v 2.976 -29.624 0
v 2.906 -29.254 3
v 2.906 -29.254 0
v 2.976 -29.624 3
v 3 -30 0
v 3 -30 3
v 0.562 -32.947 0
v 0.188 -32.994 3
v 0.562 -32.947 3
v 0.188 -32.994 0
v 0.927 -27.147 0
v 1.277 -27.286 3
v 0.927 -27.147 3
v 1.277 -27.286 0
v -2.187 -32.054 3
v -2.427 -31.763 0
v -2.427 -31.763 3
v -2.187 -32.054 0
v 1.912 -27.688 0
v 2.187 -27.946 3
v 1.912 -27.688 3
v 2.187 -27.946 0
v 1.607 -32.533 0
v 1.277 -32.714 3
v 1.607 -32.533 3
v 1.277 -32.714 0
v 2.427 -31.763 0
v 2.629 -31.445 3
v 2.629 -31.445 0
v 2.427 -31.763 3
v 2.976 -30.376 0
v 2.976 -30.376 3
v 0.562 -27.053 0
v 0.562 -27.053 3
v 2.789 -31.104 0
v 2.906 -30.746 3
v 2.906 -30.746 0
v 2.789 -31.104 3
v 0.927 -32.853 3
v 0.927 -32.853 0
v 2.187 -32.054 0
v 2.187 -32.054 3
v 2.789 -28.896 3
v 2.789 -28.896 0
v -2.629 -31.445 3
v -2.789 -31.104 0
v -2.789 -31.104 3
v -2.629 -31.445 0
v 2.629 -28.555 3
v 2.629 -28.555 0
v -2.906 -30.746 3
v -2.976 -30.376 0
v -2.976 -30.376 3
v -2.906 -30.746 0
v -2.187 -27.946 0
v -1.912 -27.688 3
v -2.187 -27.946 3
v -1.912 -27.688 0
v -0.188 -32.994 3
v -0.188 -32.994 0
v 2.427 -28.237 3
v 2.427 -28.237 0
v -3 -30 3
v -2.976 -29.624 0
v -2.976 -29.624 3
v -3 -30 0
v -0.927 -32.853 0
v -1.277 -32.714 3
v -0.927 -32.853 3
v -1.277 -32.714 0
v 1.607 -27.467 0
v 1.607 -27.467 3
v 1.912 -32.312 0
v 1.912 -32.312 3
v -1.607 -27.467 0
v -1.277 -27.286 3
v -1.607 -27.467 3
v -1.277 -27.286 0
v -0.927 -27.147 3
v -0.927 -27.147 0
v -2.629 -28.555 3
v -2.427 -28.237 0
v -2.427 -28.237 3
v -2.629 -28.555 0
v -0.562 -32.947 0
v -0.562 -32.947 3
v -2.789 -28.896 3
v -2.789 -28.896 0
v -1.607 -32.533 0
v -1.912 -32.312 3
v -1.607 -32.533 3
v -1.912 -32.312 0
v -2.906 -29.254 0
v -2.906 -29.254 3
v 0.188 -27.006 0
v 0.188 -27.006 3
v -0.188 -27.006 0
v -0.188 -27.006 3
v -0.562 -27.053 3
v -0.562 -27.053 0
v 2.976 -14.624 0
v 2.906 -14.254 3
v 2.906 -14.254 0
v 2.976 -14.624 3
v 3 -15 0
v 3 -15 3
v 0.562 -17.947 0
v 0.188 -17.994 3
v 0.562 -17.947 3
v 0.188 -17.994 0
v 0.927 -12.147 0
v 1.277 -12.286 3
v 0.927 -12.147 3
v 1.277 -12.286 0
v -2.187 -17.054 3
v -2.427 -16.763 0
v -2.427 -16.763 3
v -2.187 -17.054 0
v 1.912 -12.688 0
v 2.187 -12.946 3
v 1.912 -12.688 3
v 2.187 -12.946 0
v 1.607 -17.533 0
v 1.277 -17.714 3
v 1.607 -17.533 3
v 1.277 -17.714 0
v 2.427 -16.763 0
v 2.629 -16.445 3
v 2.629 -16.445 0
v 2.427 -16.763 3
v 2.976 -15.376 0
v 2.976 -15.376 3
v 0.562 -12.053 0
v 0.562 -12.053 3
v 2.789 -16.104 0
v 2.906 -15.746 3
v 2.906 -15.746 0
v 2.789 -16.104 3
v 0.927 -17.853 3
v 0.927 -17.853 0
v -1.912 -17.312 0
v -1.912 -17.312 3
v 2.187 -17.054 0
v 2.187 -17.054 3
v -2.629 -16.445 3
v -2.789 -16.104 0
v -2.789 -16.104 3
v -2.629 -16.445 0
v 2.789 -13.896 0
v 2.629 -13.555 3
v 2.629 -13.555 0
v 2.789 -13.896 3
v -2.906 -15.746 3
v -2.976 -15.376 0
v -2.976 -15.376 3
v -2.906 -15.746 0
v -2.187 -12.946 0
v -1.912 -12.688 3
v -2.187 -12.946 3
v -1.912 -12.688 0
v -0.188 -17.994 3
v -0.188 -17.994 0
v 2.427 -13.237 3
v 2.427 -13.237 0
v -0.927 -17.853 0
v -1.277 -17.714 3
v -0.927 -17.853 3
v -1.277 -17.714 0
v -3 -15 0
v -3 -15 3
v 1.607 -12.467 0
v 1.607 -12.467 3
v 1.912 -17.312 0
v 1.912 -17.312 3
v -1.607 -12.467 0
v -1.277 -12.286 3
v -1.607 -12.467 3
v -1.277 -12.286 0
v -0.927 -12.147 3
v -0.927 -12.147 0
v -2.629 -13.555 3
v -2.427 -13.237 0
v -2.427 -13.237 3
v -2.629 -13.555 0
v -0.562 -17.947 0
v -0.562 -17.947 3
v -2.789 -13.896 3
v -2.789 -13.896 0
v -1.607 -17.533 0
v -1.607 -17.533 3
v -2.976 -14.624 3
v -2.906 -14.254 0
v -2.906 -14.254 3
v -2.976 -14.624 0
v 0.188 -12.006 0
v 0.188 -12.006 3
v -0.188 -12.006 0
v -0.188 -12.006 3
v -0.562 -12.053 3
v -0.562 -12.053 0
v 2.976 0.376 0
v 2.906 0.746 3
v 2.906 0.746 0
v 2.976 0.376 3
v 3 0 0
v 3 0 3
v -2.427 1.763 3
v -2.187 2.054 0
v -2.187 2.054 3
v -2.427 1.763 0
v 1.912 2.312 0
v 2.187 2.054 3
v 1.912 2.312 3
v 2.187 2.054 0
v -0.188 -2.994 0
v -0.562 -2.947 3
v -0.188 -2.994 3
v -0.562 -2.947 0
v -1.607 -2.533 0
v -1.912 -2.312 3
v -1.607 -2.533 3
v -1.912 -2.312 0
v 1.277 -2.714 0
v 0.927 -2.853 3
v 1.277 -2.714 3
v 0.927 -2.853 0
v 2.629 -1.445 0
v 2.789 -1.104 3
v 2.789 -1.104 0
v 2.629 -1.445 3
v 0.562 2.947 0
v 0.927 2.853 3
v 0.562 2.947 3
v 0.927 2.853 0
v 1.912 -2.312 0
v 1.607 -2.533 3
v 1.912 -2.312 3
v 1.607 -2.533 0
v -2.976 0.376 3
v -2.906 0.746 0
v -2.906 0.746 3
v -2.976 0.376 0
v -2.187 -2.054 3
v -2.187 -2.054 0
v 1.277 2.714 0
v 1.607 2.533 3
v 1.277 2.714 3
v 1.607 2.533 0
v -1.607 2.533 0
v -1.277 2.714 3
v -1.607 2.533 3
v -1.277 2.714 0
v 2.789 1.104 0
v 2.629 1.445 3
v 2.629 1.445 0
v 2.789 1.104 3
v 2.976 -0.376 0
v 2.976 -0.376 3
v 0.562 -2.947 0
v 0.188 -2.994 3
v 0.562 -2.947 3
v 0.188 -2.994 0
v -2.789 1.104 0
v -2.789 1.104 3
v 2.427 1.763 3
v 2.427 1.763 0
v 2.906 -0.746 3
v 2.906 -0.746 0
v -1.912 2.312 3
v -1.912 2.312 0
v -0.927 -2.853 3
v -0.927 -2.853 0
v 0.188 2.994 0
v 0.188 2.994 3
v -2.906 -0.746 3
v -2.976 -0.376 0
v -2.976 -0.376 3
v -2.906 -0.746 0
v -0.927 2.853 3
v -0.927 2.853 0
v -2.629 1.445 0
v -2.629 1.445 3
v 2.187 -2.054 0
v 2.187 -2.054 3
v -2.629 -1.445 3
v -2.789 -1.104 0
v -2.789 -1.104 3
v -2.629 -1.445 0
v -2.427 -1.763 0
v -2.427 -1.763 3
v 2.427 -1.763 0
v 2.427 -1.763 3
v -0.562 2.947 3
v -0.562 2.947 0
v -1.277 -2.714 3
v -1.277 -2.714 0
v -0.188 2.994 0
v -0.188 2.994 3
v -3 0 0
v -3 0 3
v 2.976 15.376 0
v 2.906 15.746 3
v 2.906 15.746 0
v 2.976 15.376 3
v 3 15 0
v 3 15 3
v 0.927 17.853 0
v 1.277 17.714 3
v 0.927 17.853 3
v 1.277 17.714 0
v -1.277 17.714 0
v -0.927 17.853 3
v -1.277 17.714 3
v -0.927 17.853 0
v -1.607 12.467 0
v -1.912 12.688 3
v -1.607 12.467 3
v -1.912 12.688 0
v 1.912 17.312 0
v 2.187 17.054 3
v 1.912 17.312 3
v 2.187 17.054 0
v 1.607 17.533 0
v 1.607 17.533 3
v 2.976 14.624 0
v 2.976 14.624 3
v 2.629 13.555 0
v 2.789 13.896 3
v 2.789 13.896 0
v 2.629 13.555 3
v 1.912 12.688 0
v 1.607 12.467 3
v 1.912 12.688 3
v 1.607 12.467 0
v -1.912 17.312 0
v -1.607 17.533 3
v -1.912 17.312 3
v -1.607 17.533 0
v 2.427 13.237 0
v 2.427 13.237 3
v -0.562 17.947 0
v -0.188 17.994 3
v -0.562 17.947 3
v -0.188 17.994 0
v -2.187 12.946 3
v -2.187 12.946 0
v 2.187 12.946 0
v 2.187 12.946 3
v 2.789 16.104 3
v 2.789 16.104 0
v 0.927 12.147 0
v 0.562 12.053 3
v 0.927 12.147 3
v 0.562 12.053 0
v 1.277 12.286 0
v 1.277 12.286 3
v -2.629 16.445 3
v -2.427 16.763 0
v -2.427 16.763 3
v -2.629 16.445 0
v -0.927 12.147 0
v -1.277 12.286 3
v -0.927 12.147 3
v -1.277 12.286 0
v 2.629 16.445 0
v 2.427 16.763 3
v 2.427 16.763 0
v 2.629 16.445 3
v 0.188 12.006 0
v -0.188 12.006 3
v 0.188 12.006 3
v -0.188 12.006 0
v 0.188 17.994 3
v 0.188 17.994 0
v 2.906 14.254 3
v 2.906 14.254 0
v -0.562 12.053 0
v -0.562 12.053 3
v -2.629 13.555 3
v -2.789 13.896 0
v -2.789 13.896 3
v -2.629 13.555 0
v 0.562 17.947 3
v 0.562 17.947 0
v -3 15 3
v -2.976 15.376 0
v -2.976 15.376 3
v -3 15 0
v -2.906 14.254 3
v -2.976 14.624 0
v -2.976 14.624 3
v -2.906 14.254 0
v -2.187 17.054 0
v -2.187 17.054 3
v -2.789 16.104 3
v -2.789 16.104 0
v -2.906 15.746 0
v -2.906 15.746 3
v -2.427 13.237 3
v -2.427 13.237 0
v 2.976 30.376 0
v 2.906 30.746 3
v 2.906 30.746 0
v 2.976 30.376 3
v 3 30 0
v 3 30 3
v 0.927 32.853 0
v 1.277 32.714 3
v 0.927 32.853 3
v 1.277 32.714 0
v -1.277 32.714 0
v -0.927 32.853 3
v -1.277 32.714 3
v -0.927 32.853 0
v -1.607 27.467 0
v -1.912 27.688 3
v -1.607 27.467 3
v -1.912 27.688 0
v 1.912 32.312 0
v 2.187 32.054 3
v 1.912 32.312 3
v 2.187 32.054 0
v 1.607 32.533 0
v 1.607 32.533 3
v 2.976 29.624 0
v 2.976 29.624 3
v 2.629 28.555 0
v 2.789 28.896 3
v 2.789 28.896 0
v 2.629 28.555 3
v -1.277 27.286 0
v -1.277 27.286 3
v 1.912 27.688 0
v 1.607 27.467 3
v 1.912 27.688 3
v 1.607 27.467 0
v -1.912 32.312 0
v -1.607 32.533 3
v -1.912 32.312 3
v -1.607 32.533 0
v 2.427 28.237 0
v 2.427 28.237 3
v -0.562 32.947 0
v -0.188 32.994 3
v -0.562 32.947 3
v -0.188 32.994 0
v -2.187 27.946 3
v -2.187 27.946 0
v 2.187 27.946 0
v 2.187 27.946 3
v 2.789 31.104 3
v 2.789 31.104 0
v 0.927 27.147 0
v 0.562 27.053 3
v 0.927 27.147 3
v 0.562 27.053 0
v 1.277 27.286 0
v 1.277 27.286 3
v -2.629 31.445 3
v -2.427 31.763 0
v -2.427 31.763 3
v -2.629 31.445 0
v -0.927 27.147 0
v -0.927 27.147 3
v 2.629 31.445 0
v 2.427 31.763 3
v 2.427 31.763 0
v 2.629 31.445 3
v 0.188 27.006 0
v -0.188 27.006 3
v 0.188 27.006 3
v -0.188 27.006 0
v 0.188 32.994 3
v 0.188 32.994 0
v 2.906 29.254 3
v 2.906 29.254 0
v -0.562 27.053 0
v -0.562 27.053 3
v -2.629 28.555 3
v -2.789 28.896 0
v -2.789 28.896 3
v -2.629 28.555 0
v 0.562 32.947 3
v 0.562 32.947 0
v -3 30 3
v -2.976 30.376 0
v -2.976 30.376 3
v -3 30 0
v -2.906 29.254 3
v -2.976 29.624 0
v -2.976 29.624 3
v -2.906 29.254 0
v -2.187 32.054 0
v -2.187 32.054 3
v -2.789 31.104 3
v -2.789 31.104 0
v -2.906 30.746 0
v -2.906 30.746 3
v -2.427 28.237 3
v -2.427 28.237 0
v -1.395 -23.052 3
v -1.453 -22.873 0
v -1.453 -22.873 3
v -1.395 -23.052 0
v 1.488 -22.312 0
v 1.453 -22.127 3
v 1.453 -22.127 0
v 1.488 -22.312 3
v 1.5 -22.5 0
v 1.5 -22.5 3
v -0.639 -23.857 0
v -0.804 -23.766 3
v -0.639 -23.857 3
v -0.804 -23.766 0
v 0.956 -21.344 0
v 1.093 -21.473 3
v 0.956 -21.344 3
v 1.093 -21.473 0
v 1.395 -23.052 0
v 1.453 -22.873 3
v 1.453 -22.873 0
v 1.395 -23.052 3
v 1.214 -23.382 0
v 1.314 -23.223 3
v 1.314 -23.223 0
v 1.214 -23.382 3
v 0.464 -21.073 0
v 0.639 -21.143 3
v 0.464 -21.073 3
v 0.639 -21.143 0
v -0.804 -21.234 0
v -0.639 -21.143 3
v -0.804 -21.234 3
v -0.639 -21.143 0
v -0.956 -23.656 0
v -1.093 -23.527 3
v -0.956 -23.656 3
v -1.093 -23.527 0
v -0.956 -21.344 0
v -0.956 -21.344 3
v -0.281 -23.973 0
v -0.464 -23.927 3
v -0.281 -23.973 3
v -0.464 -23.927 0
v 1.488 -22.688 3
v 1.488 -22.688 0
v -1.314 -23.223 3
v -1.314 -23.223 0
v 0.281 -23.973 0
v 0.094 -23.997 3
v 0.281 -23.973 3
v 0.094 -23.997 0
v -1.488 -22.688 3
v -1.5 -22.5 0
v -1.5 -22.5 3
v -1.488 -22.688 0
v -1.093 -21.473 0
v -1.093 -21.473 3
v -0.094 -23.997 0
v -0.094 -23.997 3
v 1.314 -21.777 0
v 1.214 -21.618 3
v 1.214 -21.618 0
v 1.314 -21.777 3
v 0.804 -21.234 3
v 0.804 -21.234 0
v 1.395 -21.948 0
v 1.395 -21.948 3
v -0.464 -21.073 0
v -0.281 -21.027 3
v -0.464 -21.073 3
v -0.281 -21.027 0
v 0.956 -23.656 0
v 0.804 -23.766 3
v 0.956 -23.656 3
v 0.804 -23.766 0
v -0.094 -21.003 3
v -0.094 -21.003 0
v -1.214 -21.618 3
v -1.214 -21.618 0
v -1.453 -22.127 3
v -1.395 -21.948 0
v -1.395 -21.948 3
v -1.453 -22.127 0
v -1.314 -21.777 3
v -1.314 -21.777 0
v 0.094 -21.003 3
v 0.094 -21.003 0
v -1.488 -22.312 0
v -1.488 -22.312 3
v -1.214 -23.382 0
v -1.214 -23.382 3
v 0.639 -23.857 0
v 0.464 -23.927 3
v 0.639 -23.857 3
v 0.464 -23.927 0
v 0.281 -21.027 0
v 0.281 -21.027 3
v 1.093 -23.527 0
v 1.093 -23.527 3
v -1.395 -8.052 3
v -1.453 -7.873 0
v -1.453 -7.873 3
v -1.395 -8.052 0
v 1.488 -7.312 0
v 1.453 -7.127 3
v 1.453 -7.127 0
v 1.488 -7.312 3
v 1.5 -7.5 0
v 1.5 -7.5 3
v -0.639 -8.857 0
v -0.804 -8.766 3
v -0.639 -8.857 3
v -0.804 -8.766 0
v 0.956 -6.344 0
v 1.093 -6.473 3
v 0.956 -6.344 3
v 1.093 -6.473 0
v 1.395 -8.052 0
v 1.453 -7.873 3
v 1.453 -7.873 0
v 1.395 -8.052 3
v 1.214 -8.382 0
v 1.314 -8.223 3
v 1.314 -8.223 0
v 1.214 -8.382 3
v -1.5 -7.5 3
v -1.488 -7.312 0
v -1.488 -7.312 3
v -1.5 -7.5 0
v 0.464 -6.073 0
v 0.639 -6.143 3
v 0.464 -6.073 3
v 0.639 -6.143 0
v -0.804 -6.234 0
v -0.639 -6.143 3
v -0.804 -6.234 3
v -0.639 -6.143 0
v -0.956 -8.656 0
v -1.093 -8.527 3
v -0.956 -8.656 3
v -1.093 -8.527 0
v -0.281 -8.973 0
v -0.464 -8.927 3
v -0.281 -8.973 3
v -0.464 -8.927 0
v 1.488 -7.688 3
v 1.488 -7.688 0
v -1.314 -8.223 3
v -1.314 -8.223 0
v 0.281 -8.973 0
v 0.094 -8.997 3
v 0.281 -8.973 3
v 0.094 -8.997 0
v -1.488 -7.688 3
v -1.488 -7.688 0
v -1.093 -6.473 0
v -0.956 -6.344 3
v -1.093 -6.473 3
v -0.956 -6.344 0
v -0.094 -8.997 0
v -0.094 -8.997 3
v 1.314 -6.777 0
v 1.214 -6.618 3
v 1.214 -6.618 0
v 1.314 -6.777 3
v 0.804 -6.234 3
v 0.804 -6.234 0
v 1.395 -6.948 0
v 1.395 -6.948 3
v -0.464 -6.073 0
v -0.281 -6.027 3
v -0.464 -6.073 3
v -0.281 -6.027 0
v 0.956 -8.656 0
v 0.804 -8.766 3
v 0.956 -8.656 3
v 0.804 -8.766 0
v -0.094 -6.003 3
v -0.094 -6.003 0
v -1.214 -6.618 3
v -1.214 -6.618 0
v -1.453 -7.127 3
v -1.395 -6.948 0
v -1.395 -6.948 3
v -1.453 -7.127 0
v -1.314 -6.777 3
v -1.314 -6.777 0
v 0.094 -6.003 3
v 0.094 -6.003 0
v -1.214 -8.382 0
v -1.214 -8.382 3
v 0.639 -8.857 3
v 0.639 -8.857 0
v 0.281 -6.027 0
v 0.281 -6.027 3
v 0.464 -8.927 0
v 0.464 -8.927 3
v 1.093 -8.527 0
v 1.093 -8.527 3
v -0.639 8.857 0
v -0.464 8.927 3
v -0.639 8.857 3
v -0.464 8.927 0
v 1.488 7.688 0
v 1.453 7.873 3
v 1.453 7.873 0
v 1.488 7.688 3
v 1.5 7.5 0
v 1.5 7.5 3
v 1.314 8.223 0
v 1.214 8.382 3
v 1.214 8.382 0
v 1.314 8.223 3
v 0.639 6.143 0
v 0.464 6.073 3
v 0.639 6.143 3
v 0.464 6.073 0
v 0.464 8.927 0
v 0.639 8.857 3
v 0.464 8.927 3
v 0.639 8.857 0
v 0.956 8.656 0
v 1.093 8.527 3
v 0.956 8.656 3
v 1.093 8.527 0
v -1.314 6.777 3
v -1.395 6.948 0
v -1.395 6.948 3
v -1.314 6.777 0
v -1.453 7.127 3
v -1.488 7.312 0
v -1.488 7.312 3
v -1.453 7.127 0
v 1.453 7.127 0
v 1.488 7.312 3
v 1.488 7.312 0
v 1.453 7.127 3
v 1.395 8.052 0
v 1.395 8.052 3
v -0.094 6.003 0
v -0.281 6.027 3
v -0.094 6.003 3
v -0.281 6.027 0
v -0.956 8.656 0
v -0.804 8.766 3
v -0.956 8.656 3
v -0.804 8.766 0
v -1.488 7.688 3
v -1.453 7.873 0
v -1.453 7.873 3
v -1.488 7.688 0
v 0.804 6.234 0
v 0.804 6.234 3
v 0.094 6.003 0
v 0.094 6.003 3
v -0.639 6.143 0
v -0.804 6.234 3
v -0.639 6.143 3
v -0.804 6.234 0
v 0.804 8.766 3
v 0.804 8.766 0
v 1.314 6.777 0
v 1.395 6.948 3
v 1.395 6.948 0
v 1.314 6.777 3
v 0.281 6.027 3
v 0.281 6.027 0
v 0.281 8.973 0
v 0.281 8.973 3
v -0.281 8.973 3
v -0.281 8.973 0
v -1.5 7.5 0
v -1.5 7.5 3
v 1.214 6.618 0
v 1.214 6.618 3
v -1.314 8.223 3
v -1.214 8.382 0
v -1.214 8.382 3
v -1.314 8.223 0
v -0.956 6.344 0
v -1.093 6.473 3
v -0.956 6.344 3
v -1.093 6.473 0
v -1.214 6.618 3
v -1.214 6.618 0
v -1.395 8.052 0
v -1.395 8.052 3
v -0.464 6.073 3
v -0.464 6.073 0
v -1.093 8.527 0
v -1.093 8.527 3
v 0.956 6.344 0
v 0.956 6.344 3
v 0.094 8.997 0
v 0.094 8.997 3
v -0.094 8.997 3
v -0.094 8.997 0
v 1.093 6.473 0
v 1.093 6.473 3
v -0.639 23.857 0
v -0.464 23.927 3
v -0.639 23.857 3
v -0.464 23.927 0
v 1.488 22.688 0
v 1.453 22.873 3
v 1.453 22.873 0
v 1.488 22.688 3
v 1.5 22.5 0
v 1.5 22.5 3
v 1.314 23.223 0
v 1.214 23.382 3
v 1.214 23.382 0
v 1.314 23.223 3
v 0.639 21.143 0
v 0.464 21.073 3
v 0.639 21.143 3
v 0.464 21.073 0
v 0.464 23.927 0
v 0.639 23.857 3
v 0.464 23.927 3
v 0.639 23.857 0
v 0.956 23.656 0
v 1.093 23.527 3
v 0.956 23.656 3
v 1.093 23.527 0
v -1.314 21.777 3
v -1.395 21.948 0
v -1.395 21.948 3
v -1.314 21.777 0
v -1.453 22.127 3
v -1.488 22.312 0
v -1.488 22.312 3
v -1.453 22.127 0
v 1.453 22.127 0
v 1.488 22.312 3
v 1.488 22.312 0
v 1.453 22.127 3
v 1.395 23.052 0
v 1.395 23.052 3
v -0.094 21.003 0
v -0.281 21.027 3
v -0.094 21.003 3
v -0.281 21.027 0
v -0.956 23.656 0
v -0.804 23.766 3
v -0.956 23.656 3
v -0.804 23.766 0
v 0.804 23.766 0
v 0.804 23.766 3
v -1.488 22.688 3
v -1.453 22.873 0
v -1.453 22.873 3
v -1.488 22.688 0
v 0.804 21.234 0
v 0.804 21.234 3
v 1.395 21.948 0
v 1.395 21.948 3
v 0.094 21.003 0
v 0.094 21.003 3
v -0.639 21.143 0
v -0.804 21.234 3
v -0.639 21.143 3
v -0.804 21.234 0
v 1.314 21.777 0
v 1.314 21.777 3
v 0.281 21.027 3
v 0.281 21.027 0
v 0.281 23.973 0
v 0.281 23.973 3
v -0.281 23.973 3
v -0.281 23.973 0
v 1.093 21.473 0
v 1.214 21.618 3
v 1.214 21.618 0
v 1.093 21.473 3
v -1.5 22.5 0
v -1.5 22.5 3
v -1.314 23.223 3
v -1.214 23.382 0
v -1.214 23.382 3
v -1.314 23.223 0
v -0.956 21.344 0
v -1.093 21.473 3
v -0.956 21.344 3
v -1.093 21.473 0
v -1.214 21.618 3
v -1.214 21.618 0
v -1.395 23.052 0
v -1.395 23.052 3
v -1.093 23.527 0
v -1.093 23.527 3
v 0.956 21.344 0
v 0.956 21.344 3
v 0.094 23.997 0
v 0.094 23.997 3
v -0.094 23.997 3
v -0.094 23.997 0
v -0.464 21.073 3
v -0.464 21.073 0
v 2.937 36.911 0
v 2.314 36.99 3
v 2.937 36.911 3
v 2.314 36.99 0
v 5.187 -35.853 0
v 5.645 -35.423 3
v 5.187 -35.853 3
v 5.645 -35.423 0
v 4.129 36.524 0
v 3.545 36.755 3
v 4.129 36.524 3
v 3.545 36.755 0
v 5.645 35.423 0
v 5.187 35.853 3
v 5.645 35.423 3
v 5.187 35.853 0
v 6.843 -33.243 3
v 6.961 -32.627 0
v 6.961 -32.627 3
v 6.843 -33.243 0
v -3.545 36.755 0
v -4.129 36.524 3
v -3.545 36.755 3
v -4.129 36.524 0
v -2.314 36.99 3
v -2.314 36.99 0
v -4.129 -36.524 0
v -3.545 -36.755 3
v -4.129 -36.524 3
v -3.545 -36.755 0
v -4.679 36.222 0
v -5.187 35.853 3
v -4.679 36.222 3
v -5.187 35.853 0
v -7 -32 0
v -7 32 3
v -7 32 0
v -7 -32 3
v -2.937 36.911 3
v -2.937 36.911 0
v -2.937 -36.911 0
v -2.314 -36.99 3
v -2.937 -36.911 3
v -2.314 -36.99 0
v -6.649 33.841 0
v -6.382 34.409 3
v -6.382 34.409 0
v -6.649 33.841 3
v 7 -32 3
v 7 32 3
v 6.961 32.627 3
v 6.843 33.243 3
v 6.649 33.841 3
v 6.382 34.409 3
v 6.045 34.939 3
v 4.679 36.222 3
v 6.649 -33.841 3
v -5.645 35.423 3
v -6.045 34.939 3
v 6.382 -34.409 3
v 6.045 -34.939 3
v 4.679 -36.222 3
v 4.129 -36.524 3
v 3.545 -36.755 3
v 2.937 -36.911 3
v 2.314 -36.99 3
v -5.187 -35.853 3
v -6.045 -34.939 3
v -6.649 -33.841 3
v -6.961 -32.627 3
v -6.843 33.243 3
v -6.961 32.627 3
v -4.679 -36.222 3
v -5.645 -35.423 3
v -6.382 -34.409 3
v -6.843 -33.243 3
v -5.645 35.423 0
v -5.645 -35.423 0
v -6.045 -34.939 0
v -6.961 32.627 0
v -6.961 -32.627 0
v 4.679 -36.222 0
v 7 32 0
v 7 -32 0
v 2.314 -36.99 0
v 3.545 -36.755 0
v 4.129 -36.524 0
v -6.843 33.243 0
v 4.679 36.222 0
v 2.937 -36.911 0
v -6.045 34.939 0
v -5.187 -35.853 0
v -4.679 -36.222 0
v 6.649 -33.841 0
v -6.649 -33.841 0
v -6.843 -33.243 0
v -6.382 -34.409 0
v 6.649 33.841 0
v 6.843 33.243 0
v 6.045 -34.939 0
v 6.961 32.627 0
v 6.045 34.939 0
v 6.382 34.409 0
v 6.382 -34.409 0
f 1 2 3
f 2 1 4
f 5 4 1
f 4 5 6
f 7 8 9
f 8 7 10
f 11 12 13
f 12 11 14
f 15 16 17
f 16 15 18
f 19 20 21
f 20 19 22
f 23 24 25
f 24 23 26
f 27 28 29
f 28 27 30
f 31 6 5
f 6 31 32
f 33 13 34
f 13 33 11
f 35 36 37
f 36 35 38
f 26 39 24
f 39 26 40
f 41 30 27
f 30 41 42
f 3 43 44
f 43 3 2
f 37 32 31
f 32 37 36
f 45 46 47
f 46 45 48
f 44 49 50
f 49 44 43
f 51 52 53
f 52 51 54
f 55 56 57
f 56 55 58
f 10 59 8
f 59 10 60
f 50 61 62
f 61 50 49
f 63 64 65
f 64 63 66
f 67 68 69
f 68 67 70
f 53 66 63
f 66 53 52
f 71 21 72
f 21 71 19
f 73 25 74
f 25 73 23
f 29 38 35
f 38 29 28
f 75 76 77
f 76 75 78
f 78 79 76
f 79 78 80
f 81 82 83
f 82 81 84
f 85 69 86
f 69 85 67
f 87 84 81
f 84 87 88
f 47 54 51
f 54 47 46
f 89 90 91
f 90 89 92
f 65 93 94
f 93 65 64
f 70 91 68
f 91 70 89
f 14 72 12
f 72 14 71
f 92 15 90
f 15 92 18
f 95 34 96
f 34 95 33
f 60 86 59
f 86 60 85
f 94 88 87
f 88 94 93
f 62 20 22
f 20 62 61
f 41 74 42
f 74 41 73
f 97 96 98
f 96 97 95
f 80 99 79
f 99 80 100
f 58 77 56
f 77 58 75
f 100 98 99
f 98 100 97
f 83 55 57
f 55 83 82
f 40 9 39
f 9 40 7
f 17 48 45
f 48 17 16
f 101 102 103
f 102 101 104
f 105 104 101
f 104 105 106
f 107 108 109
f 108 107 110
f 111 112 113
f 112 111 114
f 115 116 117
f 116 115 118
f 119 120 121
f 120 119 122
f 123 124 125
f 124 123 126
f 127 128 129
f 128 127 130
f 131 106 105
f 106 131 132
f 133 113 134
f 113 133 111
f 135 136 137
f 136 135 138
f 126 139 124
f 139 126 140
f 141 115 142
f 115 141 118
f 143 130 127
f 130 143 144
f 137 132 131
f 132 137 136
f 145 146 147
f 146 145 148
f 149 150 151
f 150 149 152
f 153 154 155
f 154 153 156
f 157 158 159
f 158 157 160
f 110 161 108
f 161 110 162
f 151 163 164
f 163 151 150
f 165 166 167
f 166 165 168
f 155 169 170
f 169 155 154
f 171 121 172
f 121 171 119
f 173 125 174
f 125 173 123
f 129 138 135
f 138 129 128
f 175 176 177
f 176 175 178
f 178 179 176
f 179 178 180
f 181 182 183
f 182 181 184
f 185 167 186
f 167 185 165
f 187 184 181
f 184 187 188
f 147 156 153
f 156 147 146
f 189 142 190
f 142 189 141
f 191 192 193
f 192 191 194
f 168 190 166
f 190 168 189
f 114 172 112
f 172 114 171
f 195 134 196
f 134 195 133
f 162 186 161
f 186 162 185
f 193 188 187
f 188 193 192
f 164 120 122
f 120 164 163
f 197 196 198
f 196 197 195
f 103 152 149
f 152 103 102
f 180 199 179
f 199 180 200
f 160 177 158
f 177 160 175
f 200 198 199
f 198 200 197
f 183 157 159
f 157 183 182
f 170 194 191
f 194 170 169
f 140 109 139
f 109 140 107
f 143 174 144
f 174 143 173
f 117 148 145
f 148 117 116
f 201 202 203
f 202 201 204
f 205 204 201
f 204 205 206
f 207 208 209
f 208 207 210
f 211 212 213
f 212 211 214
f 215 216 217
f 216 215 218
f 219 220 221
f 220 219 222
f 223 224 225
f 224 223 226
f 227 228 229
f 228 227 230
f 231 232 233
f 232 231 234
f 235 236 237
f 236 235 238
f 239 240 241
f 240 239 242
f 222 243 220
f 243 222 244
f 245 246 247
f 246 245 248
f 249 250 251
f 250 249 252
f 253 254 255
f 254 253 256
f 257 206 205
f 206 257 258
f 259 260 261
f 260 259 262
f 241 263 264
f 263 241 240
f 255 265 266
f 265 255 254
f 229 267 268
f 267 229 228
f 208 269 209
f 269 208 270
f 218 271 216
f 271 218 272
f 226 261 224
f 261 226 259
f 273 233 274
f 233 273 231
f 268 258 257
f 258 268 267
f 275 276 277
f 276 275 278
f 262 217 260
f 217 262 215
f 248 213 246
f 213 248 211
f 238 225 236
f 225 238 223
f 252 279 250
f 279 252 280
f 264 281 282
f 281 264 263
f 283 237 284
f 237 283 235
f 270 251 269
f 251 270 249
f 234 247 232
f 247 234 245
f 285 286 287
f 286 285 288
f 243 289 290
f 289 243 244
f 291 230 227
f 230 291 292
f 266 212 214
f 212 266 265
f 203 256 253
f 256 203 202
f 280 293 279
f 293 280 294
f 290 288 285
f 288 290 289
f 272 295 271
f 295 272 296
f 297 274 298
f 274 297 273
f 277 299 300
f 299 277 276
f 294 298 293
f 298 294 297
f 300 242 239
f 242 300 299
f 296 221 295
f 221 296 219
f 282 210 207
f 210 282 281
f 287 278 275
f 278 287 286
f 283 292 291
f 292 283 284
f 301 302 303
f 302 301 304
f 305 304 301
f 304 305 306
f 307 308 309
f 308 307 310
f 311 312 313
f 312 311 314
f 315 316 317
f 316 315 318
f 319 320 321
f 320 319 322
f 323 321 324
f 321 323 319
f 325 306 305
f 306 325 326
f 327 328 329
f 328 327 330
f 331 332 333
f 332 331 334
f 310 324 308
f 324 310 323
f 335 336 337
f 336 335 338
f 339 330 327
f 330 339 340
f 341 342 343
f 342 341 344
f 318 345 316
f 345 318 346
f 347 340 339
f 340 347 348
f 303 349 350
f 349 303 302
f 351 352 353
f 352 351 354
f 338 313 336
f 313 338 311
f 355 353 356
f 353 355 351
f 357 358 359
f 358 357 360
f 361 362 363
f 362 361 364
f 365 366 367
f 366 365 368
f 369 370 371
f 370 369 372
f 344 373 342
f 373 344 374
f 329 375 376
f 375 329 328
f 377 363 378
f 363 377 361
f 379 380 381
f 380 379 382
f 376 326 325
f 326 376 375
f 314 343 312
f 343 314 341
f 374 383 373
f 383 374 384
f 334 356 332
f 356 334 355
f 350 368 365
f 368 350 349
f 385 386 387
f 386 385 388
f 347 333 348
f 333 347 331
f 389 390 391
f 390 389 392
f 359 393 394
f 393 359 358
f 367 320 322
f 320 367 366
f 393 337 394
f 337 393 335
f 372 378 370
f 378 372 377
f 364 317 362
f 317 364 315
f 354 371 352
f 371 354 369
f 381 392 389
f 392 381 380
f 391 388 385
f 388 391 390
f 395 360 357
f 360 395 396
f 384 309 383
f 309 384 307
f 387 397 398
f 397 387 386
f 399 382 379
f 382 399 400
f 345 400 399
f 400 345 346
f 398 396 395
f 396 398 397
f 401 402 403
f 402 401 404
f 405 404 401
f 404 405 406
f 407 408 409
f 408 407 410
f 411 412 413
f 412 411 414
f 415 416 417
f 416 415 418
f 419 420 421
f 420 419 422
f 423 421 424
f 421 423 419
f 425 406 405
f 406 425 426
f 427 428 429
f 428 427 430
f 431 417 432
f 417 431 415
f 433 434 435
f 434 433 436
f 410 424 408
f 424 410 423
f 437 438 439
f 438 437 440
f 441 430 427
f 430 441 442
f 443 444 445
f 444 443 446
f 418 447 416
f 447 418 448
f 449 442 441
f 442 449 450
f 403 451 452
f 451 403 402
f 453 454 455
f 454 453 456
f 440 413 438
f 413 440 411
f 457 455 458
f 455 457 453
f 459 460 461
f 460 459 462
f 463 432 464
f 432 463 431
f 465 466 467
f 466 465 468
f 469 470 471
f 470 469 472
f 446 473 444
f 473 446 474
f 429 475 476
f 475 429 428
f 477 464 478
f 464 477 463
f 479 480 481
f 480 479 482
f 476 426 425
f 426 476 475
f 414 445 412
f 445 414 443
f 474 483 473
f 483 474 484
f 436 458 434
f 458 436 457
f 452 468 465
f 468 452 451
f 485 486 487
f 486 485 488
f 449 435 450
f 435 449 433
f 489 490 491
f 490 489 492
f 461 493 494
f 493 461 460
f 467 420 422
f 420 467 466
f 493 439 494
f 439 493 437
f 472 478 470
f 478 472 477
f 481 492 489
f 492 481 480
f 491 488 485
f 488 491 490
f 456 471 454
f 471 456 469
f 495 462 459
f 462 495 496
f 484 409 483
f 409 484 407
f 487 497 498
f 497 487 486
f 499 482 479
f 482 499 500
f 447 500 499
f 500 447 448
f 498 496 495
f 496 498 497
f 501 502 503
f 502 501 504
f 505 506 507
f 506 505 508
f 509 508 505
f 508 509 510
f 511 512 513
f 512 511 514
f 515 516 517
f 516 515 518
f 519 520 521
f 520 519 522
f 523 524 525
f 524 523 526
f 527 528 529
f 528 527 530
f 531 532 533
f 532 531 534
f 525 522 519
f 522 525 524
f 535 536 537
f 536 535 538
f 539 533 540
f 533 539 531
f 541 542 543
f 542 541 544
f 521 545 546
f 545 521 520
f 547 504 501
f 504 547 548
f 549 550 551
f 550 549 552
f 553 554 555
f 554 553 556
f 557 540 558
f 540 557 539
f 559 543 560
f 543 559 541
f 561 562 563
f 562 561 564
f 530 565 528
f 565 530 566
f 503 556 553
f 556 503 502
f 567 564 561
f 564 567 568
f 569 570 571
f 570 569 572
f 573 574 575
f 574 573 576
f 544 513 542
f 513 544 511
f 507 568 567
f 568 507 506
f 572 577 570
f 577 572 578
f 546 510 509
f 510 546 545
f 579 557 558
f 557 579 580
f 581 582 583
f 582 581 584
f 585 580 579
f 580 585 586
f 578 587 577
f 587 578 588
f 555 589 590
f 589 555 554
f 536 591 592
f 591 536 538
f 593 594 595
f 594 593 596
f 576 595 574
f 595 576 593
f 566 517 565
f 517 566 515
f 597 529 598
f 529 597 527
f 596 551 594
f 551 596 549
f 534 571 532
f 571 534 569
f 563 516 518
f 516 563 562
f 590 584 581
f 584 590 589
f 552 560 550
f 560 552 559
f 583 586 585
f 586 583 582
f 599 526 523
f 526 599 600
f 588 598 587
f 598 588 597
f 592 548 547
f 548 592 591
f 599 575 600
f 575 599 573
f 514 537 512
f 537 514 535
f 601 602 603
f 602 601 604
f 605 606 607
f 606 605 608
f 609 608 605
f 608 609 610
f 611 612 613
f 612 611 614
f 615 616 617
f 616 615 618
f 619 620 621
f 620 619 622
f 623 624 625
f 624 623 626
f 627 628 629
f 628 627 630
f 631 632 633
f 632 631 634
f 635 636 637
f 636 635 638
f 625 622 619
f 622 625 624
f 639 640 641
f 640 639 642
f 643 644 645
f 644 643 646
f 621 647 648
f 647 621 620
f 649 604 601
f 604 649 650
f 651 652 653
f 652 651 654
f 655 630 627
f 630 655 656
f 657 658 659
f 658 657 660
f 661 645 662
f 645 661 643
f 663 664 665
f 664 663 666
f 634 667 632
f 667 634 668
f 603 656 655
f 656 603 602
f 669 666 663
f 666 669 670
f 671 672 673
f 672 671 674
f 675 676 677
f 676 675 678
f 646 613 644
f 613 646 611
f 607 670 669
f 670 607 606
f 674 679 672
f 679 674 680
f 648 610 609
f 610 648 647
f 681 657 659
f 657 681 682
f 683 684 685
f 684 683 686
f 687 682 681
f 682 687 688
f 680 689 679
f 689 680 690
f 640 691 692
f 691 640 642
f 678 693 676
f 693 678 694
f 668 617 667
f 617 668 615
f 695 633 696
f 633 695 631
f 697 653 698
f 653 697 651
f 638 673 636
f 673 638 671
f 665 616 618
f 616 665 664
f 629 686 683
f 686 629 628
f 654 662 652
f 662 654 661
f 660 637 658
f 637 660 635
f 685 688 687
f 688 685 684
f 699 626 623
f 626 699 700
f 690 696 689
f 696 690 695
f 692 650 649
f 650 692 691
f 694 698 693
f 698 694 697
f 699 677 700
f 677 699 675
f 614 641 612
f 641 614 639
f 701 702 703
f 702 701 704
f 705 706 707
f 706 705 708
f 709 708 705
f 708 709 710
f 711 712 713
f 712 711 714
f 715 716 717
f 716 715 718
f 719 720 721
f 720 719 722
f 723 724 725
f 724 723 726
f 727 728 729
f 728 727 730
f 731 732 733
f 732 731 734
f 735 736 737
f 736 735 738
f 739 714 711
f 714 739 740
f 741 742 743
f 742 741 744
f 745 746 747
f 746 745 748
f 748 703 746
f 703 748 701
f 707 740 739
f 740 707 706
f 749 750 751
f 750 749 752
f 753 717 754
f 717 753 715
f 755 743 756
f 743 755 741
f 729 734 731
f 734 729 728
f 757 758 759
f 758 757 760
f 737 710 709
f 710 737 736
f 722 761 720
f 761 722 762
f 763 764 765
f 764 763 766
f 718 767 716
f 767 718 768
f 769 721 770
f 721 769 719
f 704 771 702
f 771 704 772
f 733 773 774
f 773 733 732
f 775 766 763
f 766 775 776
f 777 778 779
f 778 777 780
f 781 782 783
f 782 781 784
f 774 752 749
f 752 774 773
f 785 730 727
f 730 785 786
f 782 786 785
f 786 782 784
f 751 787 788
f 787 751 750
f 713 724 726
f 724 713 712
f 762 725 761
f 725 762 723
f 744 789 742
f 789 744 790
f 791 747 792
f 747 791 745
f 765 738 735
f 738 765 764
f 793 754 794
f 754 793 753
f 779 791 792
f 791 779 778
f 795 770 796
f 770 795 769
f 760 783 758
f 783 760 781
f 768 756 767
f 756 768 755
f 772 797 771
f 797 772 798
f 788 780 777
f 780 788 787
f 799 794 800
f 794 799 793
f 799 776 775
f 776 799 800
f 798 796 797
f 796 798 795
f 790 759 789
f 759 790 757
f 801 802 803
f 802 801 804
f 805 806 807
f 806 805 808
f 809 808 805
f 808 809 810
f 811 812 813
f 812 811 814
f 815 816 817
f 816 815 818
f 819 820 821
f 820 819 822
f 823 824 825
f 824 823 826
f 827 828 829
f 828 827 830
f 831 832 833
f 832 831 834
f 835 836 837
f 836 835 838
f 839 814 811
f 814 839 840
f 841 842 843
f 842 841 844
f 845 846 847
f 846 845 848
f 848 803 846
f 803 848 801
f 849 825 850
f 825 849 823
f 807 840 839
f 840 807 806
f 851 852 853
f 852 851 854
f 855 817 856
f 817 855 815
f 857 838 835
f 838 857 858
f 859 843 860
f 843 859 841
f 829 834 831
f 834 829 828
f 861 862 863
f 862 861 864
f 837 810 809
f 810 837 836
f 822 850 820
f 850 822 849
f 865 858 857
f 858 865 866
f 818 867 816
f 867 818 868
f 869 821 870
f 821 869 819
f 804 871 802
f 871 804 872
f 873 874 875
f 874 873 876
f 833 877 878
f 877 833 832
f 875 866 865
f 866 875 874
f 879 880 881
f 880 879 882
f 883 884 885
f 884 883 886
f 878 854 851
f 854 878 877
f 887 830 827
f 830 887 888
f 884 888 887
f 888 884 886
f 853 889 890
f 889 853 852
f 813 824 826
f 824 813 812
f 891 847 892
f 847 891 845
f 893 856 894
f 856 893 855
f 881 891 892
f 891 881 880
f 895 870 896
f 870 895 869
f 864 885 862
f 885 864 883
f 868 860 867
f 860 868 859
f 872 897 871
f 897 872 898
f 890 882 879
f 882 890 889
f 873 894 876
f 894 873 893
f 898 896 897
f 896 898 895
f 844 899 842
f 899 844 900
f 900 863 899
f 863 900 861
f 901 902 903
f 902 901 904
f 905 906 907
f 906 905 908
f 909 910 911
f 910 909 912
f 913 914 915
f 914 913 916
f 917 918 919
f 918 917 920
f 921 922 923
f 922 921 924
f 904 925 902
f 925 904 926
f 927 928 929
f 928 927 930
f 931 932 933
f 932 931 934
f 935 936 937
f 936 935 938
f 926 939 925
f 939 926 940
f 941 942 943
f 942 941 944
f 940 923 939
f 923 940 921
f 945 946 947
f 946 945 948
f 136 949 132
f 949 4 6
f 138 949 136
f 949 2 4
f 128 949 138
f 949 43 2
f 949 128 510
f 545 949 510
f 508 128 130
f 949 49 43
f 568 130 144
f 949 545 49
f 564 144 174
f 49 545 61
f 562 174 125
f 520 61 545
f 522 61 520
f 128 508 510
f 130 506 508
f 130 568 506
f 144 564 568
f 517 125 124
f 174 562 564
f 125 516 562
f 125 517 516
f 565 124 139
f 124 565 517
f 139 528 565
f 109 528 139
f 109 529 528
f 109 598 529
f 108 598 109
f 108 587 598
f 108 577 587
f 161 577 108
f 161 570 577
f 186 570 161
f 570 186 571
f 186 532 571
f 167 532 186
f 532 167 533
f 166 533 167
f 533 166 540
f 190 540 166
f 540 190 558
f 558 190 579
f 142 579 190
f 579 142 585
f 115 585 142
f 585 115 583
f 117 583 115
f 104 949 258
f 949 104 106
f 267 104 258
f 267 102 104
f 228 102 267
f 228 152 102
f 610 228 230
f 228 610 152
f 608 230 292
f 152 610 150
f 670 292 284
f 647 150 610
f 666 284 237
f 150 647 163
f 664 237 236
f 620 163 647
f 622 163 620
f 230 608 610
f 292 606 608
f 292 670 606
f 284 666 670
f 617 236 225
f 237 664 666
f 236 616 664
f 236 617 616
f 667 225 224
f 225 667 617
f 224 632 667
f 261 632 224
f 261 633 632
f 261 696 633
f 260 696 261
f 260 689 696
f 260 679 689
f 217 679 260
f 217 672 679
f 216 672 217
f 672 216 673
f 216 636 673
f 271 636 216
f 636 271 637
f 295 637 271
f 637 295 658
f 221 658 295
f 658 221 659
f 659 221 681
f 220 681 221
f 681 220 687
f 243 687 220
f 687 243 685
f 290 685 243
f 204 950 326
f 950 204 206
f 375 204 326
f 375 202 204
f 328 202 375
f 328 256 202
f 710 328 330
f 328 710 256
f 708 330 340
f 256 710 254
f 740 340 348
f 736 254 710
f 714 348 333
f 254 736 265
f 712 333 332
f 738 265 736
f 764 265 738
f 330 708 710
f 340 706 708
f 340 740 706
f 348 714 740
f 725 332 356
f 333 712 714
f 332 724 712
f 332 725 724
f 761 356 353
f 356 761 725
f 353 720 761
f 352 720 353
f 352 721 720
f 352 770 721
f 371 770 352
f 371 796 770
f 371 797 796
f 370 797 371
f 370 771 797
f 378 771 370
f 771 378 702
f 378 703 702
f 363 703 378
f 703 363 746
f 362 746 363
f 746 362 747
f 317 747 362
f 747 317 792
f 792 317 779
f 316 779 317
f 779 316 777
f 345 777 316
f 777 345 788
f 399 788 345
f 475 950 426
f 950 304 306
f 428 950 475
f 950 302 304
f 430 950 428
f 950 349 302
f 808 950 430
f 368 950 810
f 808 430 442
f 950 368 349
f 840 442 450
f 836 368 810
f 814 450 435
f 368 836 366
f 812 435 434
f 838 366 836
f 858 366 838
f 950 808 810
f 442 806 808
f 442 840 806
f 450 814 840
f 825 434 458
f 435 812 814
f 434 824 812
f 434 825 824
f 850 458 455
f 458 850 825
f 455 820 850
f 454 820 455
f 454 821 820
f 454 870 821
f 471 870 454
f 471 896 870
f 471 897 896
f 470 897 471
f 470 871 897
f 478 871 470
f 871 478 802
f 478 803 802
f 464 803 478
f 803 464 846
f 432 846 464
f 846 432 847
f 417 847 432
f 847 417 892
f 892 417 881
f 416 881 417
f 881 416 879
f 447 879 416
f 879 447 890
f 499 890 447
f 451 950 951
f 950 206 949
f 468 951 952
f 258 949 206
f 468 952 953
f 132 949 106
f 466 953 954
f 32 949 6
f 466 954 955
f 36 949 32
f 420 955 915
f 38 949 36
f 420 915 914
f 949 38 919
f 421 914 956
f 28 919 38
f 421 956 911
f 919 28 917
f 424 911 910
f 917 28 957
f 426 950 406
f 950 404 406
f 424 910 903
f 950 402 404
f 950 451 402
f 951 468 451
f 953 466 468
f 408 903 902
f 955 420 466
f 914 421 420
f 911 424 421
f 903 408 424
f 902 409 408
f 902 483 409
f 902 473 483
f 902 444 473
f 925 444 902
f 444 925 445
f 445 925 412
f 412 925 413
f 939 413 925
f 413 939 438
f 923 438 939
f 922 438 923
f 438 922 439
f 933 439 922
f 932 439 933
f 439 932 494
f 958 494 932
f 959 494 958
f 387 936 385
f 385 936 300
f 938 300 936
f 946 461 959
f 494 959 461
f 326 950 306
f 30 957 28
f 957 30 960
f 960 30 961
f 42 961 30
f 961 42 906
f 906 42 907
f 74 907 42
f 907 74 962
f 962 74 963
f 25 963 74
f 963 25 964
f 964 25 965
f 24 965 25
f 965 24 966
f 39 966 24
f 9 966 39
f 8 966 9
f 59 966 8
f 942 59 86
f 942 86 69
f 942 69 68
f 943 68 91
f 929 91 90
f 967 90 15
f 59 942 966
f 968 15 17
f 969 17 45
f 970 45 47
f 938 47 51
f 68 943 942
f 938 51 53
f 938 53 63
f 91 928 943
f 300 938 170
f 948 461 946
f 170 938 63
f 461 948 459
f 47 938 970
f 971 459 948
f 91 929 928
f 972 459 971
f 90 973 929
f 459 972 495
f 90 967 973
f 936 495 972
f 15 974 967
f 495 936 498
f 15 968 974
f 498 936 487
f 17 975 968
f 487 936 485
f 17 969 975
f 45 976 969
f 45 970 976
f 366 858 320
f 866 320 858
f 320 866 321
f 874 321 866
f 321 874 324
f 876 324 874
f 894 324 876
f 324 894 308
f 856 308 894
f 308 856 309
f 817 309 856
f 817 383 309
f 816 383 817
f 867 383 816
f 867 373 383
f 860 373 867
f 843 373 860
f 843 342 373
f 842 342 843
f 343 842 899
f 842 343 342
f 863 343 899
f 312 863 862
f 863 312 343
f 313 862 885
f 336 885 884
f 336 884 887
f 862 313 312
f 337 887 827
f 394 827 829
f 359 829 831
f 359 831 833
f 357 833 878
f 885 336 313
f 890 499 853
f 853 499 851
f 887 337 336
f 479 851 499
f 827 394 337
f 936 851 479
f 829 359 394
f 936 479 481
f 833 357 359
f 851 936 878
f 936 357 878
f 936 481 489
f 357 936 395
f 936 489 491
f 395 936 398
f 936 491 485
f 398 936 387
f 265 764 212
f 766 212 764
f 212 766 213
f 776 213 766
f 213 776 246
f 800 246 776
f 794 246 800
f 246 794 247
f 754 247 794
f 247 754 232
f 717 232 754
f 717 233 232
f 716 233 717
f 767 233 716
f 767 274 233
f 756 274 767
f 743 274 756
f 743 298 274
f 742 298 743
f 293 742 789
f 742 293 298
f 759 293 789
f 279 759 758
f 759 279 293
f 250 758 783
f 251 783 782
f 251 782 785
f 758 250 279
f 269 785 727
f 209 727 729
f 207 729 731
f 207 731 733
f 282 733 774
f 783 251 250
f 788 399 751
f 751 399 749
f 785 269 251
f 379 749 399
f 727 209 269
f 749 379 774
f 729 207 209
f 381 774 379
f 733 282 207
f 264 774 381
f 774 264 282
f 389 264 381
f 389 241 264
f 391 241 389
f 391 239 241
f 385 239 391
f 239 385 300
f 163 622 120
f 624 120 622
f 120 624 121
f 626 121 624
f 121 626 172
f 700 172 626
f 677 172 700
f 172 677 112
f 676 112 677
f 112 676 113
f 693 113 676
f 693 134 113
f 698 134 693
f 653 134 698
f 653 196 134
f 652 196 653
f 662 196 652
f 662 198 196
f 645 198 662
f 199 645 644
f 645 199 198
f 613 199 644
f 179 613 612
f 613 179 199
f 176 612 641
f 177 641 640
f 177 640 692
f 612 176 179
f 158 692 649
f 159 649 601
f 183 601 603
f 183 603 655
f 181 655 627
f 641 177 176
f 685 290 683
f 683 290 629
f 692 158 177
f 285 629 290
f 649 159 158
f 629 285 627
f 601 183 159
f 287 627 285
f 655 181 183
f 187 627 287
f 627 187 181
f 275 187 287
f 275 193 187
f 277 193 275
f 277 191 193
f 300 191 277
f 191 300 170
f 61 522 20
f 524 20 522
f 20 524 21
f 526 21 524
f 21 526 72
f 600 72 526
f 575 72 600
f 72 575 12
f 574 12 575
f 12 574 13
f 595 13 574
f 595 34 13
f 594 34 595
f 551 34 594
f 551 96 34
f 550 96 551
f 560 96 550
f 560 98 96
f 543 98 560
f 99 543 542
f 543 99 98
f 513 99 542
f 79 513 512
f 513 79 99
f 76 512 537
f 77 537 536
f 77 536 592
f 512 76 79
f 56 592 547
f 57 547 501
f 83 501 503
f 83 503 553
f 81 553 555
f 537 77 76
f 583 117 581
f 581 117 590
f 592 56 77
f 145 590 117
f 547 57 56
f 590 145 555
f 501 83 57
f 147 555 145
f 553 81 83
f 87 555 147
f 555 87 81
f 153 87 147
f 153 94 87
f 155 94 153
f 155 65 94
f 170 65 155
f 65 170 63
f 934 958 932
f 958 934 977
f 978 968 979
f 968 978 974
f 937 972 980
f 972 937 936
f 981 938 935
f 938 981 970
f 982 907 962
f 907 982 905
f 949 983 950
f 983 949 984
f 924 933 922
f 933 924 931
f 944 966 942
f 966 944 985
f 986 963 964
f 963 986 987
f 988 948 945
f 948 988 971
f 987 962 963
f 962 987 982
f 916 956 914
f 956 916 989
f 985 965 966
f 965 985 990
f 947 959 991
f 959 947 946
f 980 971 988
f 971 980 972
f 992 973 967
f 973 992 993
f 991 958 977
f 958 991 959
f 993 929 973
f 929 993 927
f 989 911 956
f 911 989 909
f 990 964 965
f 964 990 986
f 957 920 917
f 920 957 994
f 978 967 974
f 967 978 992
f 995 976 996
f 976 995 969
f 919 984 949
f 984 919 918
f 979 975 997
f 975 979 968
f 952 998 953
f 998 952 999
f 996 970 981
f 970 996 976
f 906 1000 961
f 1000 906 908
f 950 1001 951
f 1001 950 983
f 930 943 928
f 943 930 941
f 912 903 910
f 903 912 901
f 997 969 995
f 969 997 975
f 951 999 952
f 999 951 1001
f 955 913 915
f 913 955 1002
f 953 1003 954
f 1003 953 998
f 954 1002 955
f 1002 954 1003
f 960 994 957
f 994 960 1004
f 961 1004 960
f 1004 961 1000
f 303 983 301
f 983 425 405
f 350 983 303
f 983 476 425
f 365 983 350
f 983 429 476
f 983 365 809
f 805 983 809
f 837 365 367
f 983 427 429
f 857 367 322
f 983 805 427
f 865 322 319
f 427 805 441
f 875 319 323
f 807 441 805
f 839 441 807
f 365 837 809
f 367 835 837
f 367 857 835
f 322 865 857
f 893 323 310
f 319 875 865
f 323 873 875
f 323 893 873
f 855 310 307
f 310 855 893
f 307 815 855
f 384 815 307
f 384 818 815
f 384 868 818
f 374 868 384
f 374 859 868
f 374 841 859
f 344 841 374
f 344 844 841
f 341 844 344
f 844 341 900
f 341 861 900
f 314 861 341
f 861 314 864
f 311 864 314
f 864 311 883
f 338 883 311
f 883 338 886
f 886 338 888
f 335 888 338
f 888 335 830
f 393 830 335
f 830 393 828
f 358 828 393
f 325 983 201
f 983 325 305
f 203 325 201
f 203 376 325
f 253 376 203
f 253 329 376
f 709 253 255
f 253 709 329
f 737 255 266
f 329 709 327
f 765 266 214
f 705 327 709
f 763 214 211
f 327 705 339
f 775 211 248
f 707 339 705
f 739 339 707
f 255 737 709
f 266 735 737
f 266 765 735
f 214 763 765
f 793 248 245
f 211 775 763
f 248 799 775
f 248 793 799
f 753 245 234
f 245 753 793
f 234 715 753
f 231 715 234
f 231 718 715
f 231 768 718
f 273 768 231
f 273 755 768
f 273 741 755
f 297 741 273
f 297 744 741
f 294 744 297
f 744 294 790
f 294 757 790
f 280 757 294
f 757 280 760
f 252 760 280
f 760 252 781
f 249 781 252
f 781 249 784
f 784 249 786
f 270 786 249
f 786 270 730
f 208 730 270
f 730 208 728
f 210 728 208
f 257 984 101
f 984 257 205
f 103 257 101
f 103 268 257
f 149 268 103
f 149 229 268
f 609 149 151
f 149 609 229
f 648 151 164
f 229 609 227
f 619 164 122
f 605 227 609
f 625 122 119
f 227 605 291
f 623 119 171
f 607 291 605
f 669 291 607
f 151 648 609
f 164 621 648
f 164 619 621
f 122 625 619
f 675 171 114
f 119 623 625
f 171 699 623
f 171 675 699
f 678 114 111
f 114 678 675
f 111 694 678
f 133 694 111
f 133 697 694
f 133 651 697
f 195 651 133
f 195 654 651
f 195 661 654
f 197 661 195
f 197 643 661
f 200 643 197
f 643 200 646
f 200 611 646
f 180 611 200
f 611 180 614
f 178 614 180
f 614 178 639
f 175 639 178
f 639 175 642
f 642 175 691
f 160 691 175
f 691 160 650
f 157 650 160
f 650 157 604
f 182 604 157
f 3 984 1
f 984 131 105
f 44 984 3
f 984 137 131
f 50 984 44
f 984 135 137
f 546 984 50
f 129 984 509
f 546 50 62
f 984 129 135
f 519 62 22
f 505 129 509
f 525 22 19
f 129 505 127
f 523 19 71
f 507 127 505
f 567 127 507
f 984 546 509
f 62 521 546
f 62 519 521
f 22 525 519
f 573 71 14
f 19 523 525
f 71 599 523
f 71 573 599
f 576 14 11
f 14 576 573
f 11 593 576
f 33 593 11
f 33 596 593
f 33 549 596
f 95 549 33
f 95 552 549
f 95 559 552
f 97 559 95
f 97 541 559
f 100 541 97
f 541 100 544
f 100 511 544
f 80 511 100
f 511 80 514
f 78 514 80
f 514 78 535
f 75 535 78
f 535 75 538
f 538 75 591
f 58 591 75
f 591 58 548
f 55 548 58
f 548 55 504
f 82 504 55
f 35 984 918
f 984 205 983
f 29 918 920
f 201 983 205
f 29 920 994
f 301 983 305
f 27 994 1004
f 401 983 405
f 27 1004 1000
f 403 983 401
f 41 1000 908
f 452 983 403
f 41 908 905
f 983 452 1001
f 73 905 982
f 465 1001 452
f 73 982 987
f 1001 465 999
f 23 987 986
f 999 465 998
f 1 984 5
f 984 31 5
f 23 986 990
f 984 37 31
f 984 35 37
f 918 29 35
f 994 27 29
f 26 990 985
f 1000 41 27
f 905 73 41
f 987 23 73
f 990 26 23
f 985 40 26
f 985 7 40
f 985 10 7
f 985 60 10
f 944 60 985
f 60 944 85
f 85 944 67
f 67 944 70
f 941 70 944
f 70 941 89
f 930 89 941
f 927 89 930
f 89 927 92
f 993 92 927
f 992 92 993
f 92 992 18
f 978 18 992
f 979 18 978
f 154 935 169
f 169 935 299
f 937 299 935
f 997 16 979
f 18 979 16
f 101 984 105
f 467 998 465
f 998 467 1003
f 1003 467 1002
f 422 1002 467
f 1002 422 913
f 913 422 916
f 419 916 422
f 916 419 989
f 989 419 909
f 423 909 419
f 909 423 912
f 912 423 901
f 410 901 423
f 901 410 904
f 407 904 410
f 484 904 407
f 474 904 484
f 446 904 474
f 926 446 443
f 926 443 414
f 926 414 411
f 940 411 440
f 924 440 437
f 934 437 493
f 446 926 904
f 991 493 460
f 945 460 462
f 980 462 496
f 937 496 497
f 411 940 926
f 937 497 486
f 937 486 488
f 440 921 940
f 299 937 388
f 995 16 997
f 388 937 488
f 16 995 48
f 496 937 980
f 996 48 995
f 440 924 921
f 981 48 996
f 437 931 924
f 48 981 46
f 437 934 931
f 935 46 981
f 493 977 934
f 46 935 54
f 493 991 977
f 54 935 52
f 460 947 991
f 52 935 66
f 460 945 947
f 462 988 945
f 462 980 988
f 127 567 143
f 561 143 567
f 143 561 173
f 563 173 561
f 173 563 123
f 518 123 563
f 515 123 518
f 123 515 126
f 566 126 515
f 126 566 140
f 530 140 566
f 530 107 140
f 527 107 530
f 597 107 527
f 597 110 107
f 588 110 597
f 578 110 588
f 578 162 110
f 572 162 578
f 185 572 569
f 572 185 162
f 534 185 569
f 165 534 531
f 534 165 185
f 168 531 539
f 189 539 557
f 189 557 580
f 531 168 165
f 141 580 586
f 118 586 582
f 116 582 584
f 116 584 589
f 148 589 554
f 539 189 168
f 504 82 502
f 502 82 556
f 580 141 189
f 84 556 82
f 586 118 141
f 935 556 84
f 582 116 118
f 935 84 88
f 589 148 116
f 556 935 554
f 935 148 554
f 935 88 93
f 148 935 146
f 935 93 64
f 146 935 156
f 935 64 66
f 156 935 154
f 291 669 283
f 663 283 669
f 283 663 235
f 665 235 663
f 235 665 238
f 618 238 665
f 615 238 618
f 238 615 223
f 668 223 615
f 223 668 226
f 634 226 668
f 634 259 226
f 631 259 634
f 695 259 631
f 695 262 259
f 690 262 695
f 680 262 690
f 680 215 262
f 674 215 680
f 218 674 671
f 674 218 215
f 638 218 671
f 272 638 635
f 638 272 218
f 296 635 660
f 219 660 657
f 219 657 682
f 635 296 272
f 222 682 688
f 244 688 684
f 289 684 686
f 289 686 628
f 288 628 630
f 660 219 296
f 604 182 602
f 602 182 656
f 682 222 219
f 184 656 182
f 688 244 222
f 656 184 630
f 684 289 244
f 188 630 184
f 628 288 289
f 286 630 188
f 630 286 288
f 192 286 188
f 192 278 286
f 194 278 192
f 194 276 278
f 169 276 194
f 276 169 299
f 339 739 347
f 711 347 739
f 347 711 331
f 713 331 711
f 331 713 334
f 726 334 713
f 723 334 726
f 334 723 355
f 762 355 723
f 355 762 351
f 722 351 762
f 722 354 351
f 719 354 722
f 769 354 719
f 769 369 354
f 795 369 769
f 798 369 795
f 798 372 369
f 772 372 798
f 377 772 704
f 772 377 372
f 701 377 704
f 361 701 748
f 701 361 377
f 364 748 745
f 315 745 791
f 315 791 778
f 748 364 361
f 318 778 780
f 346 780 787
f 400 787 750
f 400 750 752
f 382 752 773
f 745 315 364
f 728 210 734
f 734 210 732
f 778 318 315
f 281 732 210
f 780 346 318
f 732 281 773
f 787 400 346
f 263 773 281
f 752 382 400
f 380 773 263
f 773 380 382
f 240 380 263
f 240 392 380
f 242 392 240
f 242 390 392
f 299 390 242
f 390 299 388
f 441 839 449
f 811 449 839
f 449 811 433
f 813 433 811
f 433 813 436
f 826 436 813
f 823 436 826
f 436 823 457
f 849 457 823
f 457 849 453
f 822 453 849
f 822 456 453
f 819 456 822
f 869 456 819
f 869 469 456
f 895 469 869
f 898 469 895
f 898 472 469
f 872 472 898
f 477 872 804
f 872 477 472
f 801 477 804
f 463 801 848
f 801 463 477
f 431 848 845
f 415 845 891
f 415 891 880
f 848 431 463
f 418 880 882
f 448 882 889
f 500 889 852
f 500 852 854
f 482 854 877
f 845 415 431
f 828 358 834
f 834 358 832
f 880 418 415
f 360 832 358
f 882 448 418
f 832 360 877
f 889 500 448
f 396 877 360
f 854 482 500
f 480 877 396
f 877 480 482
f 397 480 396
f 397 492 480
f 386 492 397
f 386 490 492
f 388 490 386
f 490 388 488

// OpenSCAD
$fn = 50;

difference() {
	union() {
		hull() {
			translate(v = [-2.0, 32.0, 0]) {
				cylinder(h = 3, r = 5);
			}
			translate(v = [2.0, 32.0, 0]) {
				cylinder(h = 3, r = 5);
			}
			translate(v = [-2.0, -32.0, 0]) {
				cylinder(h = 3, r = 5);
			}
			translate(v = [2.0, -32.0, 0]) {
				cylinder(h = 3, r = 5);
			}
		}
	}
	union() {
		translate(v = [0.0, -30.0, 0]) {
			translate(v = [0, 0, -100]) {
				cylinder(h = 200, r = 3.0);
			}
		}
		translate(v = [0.0, -15.0, 0]) {
			translate(v = [0, 0, -100]) {
				cylinder(h = 200, r = 3.0);
			}
		}
		translate(v = [0, 0, -100]) {
			cylinder(h = 200, r = 3.0);
		}
		translate(v = [0.0, 15.0, 0]) {
			translate(v = [0, 0, -100]) {
				cylinder(h = 200, r = 3.0);
			}
		}
		translate(v = [0.0, 30.0, 0]) {
			translate(v = [0, 0, -100]) {
				cylinder(h = 200, r = 3.0);
			}
		}
		translate(v = [0.0, -30.0, 0]) {
			translate(v = [0, 0, -100]) {
				cylinder(h = 200, r = 1.5);
			}
		}
		translate(v = [0.0, -22.5, 0]) {
			translate(v = [0, 0, -100]) {
				cylinder(h = 200, r = 1.5);
			}
		}
		translate(v = [0.0, -15.0, 0]) {
			translate(v = [0, 0, -100]) {
				cylinder(h = 200, r = 1.5);
			}
		}
		translate(v = [0.0, -7.5, 0]) {
			translate(v = [0, 0, -100]) {
				cylinder(h = 200, r = 1.5);
			}
		}
		translate(v = [0, 0, -100]) {
			cylinder(h = 200, r = 1.5);
		}
		translate(v = [0.0, 7.5, 0]) {
			translate(v = [0, 0, -100]) {
				cylinder(h = 200, r = 1.5);
			}
		}
		translate(v = [0.0, 15.0, 0]) {
			translate(v = [0, 0, -100]) {
				cylinder(h = 200, r = 1.5);
			}
		}
		translate(v = [0.0, 22.5, 0]) {
			translate(v = [0, 0, -100]) {
				cylinder(h = 200, r = 1.5);
			}
		}
		translate(v = [0.0, 30.0, 0]) {
			translate(v = [0, 0, -100]) {
				cylinder(h = 200, r = 1.5);
			}
		}
	}
}
